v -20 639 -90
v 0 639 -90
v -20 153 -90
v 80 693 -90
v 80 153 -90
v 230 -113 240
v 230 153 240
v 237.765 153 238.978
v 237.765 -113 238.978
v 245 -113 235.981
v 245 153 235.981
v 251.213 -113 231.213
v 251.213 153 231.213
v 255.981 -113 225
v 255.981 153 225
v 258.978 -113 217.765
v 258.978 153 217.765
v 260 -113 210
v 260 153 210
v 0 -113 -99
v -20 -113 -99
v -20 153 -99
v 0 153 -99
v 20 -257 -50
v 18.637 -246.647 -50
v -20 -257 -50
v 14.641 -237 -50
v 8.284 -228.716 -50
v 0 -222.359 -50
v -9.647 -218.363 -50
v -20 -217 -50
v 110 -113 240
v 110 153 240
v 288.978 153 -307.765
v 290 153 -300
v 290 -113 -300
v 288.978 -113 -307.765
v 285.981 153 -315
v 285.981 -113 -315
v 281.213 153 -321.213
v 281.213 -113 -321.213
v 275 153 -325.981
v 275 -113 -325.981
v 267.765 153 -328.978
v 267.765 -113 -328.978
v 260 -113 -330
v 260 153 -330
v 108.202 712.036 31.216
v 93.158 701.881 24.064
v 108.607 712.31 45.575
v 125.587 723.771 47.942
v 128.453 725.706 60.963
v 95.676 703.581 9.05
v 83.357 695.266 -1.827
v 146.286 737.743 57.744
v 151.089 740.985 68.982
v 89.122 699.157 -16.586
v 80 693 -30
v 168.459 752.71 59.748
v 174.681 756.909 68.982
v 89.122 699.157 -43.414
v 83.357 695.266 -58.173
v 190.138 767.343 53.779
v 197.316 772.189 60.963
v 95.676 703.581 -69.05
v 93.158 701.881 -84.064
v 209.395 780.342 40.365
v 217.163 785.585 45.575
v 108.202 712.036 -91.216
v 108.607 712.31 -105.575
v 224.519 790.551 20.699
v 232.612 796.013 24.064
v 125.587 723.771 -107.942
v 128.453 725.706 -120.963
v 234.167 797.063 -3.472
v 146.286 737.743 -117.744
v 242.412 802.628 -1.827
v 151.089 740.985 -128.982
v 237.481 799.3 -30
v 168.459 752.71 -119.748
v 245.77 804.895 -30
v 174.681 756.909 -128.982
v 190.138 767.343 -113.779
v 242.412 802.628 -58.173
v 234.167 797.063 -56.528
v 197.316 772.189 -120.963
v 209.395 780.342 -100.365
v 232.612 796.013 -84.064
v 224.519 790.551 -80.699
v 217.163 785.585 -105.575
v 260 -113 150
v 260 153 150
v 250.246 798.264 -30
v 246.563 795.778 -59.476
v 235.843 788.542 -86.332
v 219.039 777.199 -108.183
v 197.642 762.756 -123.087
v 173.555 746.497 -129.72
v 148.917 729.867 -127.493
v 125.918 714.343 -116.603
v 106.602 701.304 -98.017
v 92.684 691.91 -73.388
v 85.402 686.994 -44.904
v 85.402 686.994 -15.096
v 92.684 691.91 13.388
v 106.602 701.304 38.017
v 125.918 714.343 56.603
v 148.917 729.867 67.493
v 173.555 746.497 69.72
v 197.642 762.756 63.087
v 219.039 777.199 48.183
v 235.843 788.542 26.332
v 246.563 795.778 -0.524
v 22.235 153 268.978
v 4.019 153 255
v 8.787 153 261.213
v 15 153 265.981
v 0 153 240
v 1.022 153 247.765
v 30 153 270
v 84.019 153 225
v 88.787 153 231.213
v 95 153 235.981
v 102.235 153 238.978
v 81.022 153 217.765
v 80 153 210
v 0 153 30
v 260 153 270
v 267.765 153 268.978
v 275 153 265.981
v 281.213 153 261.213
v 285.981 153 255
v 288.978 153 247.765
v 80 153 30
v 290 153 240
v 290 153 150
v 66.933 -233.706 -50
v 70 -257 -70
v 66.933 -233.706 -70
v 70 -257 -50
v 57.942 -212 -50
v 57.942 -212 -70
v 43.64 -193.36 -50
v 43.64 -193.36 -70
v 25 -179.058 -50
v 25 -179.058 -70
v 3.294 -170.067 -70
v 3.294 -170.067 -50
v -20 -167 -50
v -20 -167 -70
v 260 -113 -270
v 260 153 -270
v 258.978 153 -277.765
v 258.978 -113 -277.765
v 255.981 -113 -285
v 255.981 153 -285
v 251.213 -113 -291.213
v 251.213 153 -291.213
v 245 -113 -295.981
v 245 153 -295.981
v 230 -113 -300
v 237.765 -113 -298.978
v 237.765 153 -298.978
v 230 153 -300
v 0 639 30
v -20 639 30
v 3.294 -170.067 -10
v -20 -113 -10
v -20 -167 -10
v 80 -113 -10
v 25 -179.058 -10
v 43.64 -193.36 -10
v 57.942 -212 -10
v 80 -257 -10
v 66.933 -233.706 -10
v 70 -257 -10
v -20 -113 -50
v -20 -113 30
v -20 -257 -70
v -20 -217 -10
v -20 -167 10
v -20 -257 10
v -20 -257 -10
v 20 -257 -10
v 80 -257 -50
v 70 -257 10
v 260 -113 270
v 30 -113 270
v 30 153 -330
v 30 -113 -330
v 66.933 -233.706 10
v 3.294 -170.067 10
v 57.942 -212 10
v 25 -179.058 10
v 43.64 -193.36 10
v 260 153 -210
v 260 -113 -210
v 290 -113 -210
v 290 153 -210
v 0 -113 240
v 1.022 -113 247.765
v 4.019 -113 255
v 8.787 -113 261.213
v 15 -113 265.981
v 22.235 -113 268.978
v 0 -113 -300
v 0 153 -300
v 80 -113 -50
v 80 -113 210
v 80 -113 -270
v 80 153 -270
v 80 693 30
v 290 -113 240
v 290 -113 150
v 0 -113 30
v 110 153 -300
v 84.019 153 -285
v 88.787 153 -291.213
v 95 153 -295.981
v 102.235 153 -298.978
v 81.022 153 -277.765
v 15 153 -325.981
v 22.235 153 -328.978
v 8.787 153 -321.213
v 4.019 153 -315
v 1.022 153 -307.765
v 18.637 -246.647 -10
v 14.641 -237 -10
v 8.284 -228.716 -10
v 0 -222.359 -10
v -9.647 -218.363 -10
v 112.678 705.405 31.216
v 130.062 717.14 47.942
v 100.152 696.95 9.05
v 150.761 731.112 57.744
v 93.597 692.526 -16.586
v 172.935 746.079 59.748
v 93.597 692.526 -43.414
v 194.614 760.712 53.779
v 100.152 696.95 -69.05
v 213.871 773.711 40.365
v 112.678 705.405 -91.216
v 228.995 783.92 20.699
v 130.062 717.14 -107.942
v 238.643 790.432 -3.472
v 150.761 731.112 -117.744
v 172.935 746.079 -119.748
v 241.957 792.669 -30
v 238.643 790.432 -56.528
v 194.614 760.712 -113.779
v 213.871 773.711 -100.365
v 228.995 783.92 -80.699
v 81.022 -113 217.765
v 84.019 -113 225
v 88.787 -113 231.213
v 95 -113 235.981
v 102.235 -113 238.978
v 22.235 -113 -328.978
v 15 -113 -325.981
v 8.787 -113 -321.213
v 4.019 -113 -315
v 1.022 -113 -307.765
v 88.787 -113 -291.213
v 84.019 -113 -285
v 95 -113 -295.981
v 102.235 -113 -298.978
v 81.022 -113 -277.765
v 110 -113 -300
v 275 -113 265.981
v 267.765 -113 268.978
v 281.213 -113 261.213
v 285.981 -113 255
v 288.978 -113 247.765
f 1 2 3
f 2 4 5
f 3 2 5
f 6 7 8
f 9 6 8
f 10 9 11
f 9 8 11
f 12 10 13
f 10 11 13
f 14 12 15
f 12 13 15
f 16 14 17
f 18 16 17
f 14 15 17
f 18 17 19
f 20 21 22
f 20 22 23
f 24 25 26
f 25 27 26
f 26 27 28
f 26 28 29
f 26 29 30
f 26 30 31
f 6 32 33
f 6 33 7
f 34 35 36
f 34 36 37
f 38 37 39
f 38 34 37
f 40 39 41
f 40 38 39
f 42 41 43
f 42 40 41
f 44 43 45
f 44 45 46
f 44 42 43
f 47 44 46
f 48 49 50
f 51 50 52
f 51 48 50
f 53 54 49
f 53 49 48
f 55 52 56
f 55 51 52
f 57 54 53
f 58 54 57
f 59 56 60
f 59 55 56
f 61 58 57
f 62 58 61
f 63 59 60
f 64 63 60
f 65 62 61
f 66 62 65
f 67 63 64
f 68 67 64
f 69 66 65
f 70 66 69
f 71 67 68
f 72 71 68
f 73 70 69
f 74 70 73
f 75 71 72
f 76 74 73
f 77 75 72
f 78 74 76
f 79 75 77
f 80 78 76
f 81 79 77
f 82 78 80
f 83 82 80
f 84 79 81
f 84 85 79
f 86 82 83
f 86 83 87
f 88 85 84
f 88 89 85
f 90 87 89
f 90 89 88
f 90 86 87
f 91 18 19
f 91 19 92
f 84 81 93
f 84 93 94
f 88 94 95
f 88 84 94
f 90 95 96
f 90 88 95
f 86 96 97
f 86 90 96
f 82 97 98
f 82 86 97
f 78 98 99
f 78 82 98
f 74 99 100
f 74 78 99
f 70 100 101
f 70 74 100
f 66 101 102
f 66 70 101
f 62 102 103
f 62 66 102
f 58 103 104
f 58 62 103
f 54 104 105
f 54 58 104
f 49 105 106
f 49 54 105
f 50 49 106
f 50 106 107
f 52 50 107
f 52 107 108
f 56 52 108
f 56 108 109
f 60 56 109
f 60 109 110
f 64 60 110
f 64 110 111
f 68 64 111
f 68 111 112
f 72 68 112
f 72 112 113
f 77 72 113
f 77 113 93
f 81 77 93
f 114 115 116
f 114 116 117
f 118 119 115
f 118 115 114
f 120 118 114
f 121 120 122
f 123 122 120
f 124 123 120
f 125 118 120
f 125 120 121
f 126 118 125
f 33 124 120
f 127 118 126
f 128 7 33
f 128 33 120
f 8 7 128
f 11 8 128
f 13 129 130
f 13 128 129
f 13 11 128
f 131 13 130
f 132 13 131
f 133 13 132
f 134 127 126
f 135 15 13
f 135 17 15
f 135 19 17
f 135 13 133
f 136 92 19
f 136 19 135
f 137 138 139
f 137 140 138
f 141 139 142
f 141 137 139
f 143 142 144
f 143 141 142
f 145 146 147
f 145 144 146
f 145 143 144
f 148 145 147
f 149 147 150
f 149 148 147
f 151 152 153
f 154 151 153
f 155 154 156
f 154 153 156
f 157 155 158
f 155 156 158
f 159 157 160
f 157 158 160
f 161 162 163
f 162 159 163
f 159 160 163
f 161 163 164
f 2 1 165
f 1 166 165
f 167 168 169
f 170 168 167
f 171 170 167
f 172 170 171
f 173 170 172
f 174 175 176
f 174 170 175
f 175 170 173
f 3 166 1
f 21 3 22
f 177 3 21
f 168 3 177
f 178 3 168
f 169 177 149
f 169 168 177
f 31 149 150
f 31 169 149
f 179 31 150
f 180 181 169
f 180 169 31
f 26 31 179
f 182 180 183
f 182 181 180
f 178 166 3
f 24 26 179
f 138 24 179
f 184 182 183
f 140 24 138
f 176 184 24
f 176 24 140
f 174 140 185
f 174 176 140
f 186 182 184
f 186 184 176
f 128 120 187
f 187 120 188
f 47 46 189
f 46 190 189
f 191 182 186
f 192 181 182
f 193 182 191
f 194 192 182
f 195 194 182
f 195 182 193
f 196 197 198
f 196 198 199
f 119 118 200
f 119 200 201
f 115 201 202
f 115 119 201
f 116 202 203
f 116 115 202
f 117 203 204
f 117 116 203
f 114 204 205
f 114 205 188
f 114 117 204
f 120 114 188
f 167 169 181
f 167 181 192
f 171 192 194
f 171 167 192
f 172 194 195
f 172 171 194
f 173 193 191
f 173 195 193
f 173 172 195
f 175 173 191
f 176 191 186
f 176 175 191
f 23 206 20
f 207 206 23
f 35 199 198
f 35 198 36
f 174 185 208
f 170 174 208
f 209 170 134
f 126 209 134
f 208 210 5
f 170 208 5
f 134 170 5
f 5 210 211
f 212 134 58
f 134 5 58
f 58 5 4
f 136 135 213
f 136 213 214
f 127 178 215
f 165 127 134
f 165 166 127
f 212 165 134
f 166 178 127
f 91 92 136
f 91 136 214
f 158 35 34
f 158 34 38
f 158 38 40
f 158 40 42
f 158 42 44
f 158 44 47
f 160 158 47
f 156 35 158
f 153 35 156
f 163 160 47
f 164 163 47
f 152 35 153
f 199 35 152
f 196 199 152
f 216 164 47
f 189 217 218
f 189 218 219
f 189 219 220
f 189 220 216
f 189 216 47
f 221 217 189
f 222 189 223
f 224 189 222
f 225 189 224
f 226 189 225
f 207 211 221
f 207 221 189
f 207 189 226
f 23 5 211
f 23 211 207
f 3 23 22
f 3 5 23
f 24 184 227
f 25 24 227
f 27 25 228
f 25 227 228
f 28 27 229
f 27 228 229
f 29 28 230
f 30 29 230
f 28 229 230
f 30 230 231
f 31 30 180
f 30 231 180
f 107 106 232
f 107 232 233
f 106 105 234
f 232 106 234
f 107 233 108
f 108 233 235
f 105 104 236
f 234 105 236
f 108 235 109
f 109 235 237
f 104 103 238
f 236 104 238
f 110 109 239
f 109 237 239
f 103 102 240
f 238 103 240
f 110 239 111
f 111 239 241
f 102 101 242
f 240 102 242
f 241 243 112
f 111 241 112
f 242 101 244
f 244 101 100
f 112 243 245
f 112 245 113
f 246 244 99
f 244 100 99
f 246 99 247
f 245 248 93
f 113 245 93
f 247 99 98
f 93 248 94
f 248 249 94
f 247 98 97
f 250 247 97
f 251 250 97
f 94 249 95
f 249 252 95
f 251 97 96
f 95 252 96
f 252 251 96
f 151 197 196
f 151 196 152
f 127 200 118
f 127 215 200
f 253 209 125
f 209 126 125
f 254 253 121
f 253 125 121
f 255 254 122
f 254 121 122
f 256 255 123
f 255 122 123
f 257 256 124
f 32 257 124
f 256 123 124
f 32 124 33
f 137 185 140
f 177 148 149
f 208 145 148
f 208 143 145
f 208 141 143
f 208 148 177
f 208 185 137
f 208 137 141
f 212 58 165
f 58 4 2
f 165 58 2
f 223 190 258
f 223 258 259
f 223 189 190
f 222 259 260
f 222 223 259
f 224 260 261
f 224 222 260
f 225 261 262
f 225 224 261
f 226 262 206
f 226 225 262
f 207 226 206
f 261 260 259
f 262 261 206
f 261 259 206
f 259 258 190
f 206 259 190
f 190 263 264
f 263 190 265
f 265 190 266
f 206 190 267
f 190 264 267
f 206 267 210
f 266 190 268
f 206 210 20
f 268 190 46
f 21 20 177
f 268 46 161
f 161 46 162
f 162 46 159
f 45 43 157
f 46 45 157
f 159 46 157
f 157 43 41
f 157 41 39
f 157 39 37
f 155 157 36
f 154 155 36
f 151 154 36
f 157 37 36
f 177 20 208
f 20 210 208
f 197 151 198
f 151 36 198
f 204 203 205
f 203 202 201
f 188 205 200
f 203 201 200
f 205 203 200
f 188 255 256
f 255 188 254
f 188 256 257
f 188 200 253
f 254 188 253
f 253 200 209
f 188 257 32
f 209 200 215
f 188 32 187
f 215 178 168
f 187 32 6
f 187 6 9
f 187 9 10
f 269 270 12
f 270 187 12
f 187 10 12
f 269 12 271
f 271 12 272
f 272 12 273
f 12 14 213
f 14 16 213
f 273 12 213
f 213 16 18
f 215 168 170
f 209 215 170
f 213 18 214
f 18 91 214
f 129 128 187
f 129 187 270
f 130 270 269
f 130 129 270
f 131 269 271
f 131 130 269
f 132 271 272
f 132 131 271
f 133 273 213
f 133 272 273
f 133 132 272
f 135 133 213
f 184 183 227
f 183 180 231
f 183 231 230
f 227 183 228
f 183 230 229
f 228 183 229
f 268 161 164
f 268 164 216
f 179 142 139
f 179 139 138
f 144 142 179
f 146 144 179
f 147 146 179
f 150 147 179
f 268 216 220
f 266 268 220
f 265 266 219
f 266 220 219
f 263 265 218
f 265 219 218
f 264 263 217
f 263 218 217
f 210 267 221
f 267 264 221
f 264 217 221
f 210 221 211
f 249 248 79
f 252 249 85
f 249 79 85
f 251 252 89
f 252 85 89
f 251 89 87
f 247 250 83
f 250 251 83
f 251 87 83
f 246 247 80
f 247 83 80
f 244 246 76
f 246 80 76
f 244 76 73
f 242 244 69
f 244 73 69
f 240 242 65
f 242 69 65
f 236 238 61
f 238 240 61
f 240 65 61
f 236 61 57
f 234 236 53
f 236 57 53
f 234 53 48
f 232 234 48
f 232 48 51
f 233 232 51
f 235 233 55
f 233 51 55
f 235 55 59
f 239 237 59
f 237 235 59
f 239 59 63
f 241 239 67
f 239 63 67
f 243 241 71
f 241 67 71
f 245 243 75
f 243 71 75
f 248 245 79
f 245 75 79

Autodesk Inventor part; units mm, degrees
ref_plane "YZ Plane" through (0, 0, 0) normal (1, 0, 0) x (0, 1, 0)
ref_plane "XZ Plane" through (0, 0, 0) normal (0, 1, 0) x (-1, 0, 0)
ref_plane "XY Plane" through (0, 0, 0) normal (0, 0, 1) x (1, 0, 0)
sketch "Sketch1" plane through (0, 0, 0) normal (0, 0, 1) x (1, 0, 0)
  line L0 (0, -27) -> (0, 396)
  line L1 (0, -27) -> (40, -27)
  line L2 (40, -27) -> (40, 423)
  line L3 (40, 423) -> (0, 396)
  point P0 (0, 0)
  dimension "d0" = 423
  dimension "d1" = 27
  dimension "d2" = 40
  dimension "d3" = 450
extrude "Extrusion1" add sketch "Sketch1" along normal mid plane 300
sketch "Sketch2" plane through (40, -27, 150) normal (1, 0, 0) x (0, 0, -1)
  line L0 (0, 450) -> (300, 450) construction
  line L1 (150, 450) -> (150, 0) construction
  line L2 (300, 0) -> (0, 0) construction
  line L3 (120, 450) -> (120, 180)
  line L4 (120, 180) -> (0, 180)
  line L5 (0, 180) -> (0, 450)
  line L6 (0, 423) -> (0, 0) projected
  line L7 (300, 450) -> (0, 450) construction
  line L8 (180, 450) -> (180, 180)
  line L9 (180, 180) -> (300, 180)
  line L10 (300, 180) -> (300, 450)
  line L11 (0, 0) -> (0, 450) projected
  line L12 (0, 450) -> (120, 450)
  line L13 (180, 450) -> (300, 450)
  point P0 (150, 27)
  dimension "d6" = 270
extrude "Extrusion2" cut sketch "Sketch2" against normal blind 263.525
sketch "Sketch3" plane through (0, 0, 150) normal (0, 0, 1) x (1, 0, 0)
  line L0 (40, -27) -> (0, -27) projected
  arc A0 (27, -27) -> (0, 0) centre (0, -27) ccw
  line L1 (0, -27) -> (0, 153) projected
  line L2 (0, 0) -> (0, -27)
  line L3 (0, -27) -> (27, -27)
  dimension "d9" = 27
extrude "Extrusion3" cut sketch "Sketch3" against normal blind 400
sketch "Sketch4" plane through (40, -27, 150) normal (1, 0, 0) x (0, 0, -1)
  line L0 (0, 0) -> (300, 0) projected
  line L1 (0, 0) -> (120, 0)
  line L2 (120, 0) -> (120, 27)
  line L3 (300, 27) -> (0, 27) projected
  line L4 (120, 27) -> (0, 27)
  line L5 (0, 0) -> (0, 180) projected
  line L6 (0, 27) -> (0, 0)
  point P0 (150, 27)
  dimension "d12" = 120
  dimension "d13" = 27
extrude "Extrusion4" cut sketch "Sketch4" against normal blind 400
mirror "Mirror1" about plane through (0, 0, 0) normal (0, 0, 1) of "Extrusion4"
sketch "Sketch5" plane through (40, 153, 150) normal (0, 1, 0) x (1, 0, 0)
  point P0 (-40, 150)
sketch "Sketch6" plane through (40, 423, 30) normal (-0.5594729, 0.8288487, 0) x (0.8288487, 0.5594729, 0)
  line L0 (0, 0) -> (0, 60) projected
  line L1 (0, 30) -> (50, 30)
  circle A0 centre (50, 30) radius 50
  circle A1 centre (50, 30) radius 45
  point P0 (-269.811, 30)
  dimension "d16" = 50
  dimension "d17" = 90
extrude "Extrusion5" add sketch "Sketch6" against normal blind 4
sketch "Sketch7" plane through (40, 153, -30) normal (1, 0, 0) x (0, 0, -1)
  line L0 (-60, -153) -> (-60, -180) projected
  line L1 (-60, -153) -> (-60, -133)
  line L2 (-60, -133) -> (-180, -133)
  line L3 (-180, -153) -> (-180, 0) projected
  line L4 (-180, -153) -> (-60, -153) projected
  line L5 (-180, -153) -> (-60, -153)
  point P0 (-30, -153)
  dimension "d20" = 20
extrude "Extrusion6" cut sketch "Sketch7" against normal blind 300
mirror "Mirror2" about plane through (0, 0, 0) normal (0, 0, 1) of "Extrusion6"
sketch "Sketch8" plane through (0, 0, 150) normal (0, 0, 1) x (1, 0, 0)
  point P0 (0, 0)
sketch "Sketch9" plane through (0, 0, 150) normal (0, 0, 1) x (1, 0, 0)
  point P0 (0, 0)
sketch "Sketch10" plane through (0, 0, 150) normal (0, 0, 1) x (1, 0, 0)
  point P0 (0, 0)
sketch "Sketch11" plane through (0, 0, 150) normal (0, 0, 1) x (1, 0, 0)
  line L0 (40, 153) -> (0, 153) projected
  line L1 (40, 20) -> (40, -27) projected
  line L2 (40, 153) -> (40, 20)
  line L3 (40, 20) -> (130, 20)
  line L4 (130, 20) -> (130, 153)
  line L5 (130, 153) -> (40, 153)
  point P0 (0, 0)
  dimension "d23" = 90
extrude "Extrusion7" add sketch "Sketch11" against normal blind 15
mirror "Mirror3" about plane through (0, 0, 0) normal (0, 0, 1) of "Extrusion7"
sketch "Sketch12" plane through (130, 20, 150) normal (1, 0, 0) x (0, 0, -1)
  line L0 (0, 133) -> (0, 0) projected
  line L1 (0, 133) -> (60, 133)
  line L2 (0, 133) -> (120, 133) projected
  line L3 (60, 133) -> (60, 0)
  line L4 (15, 0) -> (120, 0) projected
  line L5 (60, 0) -> (0, 0)
  line L6 (0, 0) -> (0, 133)
  point P0 (150, -20)
extrude "Extrusion8" add sketch "Sketch12" along normal blind 15
mirror "Mirror4" about plane through (0, 0, 0) normal (0, 0, 1) of "Extrusion8"
sketch "Sketch13" plane through (40, 153, -30) normal (1, 0, 0) x (0, 0, -1)
  line L0 (-60, -153) -> (-60, -133) projected
  line L1 (-60, -133) -> (-40, -133)
  line L2 (-40, -133) -> (-40, -180)
  line L3 (-60, -180) -> (0, -180) projected
  line L4 (-40, -180) -> (-60, -180)
  line L5 (-60, -180) -> (-60, -133)
  point P0 (-30, -153)
  dimension "d28" = 20
extrude "Extrusion9" cut sketch "Sketch13" against normal blind 200
mirror "Mirror5" about plane through (0, 0, 0) normal (0, 0, 1) of "Extrusion9"
sketch "Sketch14" plane through (0, 153, 30) normal (0, 1, 0) x (1, 0, 0)
  line L0 (0, -120) -> (0, 0) projected
  line L1 (0, 0) -> (0, -105)
  line L2 (145, -120) -> (0, -120) projected
  line L3 (15, -120) -> (145, -120)
  arc A0 (0, -105) -> (15, -120) centre (15, -105) ccw
  line L4 (0, 0) -> (0, -120)
  line L5 (0, -120) -> (145, -120)
  arc A1 (0, -105) -> (15, -120) centre (15, -105) ccw
  line L6 (0, -105) -> (0, -120)
  line L7 (0, -120) -> (15, -120)
  arc A2 (0, -105) -> (15, -120) centre (15, -105) ccw
  point P0 (0, 30)
  dimension "d31" = 15
extrude "Extrusion10" cut sketch "Sketch14" against normal blind 200
sketch "Sketch15" plane through (0, 153, 30) normal (0, 1, 0) x (1, 0, 0)
  line L0 (40, 0) -> (40, -105) projected
  line L1 (40, 0) -> (40, -90)
  line L2 (40, -105) -> (130, -105) projected
  line L3 (55, -105) -> (130, -105)
  arc A0 (40, -90) -> (55, -105) centre (55, -90) ccw
  arc A1 (40, -90) -> (55, -105) centre (55, -90) ccw
  line L4 (40, -90) -> (40, -105)
  line L5 (40, -105) -> (55, -105)
  point P0 (0, 30)
  dimension "d34" = 15
sketch "Sketch16" plane through (0, 0, 150) normal (0, 0, 1) x (1, 0, 0)
  point P0 (0, 0)
extrude "Extrusion11" add sketch "Sketch15" against normal blind 133
mirror "Mirror6" about plane through (0, 0, 0) normal (0, 0, 1) of "Extrusion11", "Extrusion10"
sketch "Sketch17" plane through (0, 153, 30) normal (0, 1, 0) x (1, 0, 0)
  line L0 (130, -60) -> (130, -105) projected
  line L1 (130, -60) -> (130, -90)
  line L2 (55, -105) -> (130, -105) projected
  line L3 (115, -105) -> (55, -105)
  arc A0 (115, -105) -> (130, -90) centre (115, -90) ccw
  arc A1 (115, -105) -> (130, -90) centre (115, -90) ccw
  line L4 (130, -90) -> (130, -105)
  line L5 (130, -105) -> (115, -105)
  point P0 (0, 30)
  dimension "d37" = 15
extrude "Extrusion12" add sketch "Sketch17" against normal blind 133
mirror "Mirror7" about plane through (0, 0, 0) normal (0, 0, 1) of "Extrusion12"
sketch "Sketch18" plane through (0, 153, -30) normal (0, 1, 0) x (1, 0, 0)
  line L0 (15, 120) -> (145, 120) projected
  line L1 (15, 120) -> (130, 120)
  line L2 (145, 120) -> (145, 60) projected
  line L3 (145, 105) -> (145, 60)
  arc A0 (145, 105) -> (130, 120) centre (130, 105) ccw
  arc A1 (145, 105) -> (130, 120) centre (130, 105) ccw
  line L4 (130, 120) -> (145, 120)
  line L5 (145, 120) -> (145, 105)
  point P0 (0, -30)
  dimension "d40" = 15
extrude "Extrusion13" cut sketch "Sketch18" against normal blind 133
mirror "Mirror8" about plane through (0, 0, 0) normal (0, 0, 1) of "Extrusion13"
scale "Scale1" factors (2, 2, 2) then translate (0, -153, -30) bodies 1
sketch "Sketch19" plane through (80, 153, 30) normal (0, 0, 1) x (1, 0, 0)
  point P0 (-80, -153)
sketch "Sketch20" plane through (80, -207, -10) normal (0, 0, 1) x (1, 0, 0)
  point P0 (-80, 207)
sketch "Sketch21" plane through (80, -207, -10) normal (0, 0, 1) x (1, 0, 0)
  point P0 (-80, 207)
sketch "Sketch22" plane through (80, 153, 30) normal (0, 0, 1) x (1, 0, 0)
  line L0 (0, 540) -> (-80, 486) projected
  line L1 (-80, 486) -> (-80, -360)
  line L2 (-80, -360) -> (-100, -360)
  line L3 (-100, -360) -> (-100, 486)
  line L4 (-100, 486) -> (-80, 486)
  point P0 (-80, -153)
  dimension "d46" = 846
  dimension "d47" = 20
sketch "Sketch23" plane through (0, 153, 30) normal (-1, 0, 0) x (0, 0, 1)
  point P0 (-30, -153)
extrude "Extrusion14" add sketch "Sketch22" against normal blind 129
sketch "Sketch24" plane through (0, -207, 30) normal (1, 0, 0) x (0, 0, -1)
  line L0 (40, 94) -> (40, 0) projected
  line L1 (40, 94) -> (40, 0)
  line L2 (0, 0) -> (0, 846) projected
  line L3 (40, 0) -> (0, 0)
  line L4 (0, 0) -> (0, 94)
  line L5 (0, 94) -> (40, 94)
  line L6 (40, 0) -> (0, 0)
  point P0 (30, 207)
extrude "Extrusion15" cut sketch "Sketch24" against normal blind 129
sketch "Sketch25" plane through (0, -207, -99) normal (1, 0, 0) x (0, 0, -1)
  line L0 (0, 94) -> (-49, 94) projected
  line L1 (-49, 94) -> (0, 94)
  line L2 (0, 0) -> (0, 846) projected
  line L3 (0, 94) -> (0, 0)
  line L4 (0, 0) -> (-44.5, 0)
  line L5 (-89, 0) -> (0, 0) projected
  line L6 (-49, 0) -> (-49, 54) projected
  line L7 (-49, 0) -> (-49, 94)
  point P0 (-99, 207)
extrude "Extrusion16" cut sketch "Sketch25" against normal blind 129
sketch "Sketch26" plane through (80, -207, -10) normal (0, 0, 1) x (1, 0, 0)
  line L0 (-100, 0) -> (-100, 94) projected
  line L1 (-26, 0) -> (0, 0) projected
  arc A0 (-26, 0) -> (-100, 74) centre (-100, 0) ccw
  line L2 (-100, 0) -> (-26, 0)
  line L3 (-100, 0) -> (-100, 74)
  line L4 (0, 94) -> (-100, 94) projected
  point P0 (-80, 207)
extrude "Extrusion17" cut sketch "Sketch26" against normal blind 129
sketch "Sketch27" plane through (0, 153, -90) normal (1, 0, 0) x (0, 0, -1)
  line L0 (-120, 486) -> (9, 486) projected
  line L1 (9, 486) -> (9, 0)
  line L2 (9, -266) -> (9, 486) projected
  line L3 (0, 486) -> (0, 0) projected
  line L4 (9, 0) -> (0, 0)
  line L5 (0, 0) -> (0, 486)
  line L6 (0, 486) -> (9, 486)
  point P0 (-90, -153)
extrude "Extrusion18" cut sketch "Sketch27" against normal blind 129
sketch "Sketch28" plane through (80, -207, -10) normal (0, 0, 1) x (1, 0, 0)
  line L0 (0, 0) -> (-26, 0) projected
  arc A0 (-10, 0) -> (-100, 90) centre (-100, 0) ccw
  line L1 (-10, 0) -> (-100, 0)
  line L2 (-100, 0) -> (-100, 90)
  point P0 (-80, 207)
  dimension "d58" = 90
sketch "Sketch29" plane through (-20, -113, 30) normal (-1, 0, 0) x (0, 0, 1)
  point P0 (-30, 113)
sketch "Sketch30" plane through (80, -207, -10) normal (0, 0, 1) x (1, 0, 0)
  line L0 (-100, 74) -> (-100, 94) projected
  line L1 (-100, 74) -> (0, 74)
  line L2 (0, 94) -> (0, 0) projected
  line L3 (0, 74) -> (0, 0)
  line L4 (0, 0) -> (0, -50)
  line L5 (0, -50) -> (-100, -50)
  line L6 (-100, -50) -> (-100, 74)
  point P0 (-80, 207)
  dimension "d59" = 50
extrude "Extrusion19" add sketch "Sketch30" against normal blind 40
sketch "Sketch31" plane through (-20, -113, -10) normal (0, 0, 1) x (1, 0, 0)
  line L0 (100, -144) -> (0, -144) projected
  arc A0 (40, -144) -> (0, -104) centre (0, -144) ccw
  line L1 (0, -144) -> (0, 0) projected
  line L2 (0, -144) -> (40, -144)
  line L3 (0, -144) -> (0, -104)
  point P0 (20, 113)
  dimension "d62" = 40
extrude "Extrusion20" cut sketch "Sketch31" against normal blind 40
sketch "Sketch32" plane through (-20, -113, -10) normal (0, 0, 1) x (1, 0, 0)
  line L0 (100, -144) -> (40, -144) projected
  arc A0 (90, -144) -> (0, -54) centre (0, -144) ccw
  line L1 (0, -144) -> (90, -144)
  line L2 (0, -144) -> (0, -54)
  line L3 (0, -104) -> (0, 0) projected
  point P0 (20, 113)
  dimension "d65" = 90
extrude "Extrusion21" add sketch "Sketch32" along normal blind 20
sketch "Sketch33" plane through (80, -113, -50) normal (0, 0, -1) x (-1, 0, 0)
  line L0 (100, -144) -> (10, -144) projected
  arc A0 (100, -54) -> (10, -144) centre (100, -144) ccw projected
  arc A1 (100, -54) -> (10, -144) centre (100, -144) ccw
  line L1 (100, -54) -> (100, -144)
  line L2 (100, -144) -> (10, -144)
  point P0 (80, 113)
  dimension "d68" = 90
extrude "Extrusion22" add sketch "Sketch33" along normal blind 20
sketch "Sketch34" plane through (0, 153, 30) normal (0, 1, 0) x (1, 0, 0)
  point P0 (0, 30)
sketch "Sketch35" plane through (260, 153, -210) normal (0, 1, 0) x (1, 0, 0)
  point P0 (-260, -210)
properties part number "TRUNK_1" material "Rubber, Silicone"
